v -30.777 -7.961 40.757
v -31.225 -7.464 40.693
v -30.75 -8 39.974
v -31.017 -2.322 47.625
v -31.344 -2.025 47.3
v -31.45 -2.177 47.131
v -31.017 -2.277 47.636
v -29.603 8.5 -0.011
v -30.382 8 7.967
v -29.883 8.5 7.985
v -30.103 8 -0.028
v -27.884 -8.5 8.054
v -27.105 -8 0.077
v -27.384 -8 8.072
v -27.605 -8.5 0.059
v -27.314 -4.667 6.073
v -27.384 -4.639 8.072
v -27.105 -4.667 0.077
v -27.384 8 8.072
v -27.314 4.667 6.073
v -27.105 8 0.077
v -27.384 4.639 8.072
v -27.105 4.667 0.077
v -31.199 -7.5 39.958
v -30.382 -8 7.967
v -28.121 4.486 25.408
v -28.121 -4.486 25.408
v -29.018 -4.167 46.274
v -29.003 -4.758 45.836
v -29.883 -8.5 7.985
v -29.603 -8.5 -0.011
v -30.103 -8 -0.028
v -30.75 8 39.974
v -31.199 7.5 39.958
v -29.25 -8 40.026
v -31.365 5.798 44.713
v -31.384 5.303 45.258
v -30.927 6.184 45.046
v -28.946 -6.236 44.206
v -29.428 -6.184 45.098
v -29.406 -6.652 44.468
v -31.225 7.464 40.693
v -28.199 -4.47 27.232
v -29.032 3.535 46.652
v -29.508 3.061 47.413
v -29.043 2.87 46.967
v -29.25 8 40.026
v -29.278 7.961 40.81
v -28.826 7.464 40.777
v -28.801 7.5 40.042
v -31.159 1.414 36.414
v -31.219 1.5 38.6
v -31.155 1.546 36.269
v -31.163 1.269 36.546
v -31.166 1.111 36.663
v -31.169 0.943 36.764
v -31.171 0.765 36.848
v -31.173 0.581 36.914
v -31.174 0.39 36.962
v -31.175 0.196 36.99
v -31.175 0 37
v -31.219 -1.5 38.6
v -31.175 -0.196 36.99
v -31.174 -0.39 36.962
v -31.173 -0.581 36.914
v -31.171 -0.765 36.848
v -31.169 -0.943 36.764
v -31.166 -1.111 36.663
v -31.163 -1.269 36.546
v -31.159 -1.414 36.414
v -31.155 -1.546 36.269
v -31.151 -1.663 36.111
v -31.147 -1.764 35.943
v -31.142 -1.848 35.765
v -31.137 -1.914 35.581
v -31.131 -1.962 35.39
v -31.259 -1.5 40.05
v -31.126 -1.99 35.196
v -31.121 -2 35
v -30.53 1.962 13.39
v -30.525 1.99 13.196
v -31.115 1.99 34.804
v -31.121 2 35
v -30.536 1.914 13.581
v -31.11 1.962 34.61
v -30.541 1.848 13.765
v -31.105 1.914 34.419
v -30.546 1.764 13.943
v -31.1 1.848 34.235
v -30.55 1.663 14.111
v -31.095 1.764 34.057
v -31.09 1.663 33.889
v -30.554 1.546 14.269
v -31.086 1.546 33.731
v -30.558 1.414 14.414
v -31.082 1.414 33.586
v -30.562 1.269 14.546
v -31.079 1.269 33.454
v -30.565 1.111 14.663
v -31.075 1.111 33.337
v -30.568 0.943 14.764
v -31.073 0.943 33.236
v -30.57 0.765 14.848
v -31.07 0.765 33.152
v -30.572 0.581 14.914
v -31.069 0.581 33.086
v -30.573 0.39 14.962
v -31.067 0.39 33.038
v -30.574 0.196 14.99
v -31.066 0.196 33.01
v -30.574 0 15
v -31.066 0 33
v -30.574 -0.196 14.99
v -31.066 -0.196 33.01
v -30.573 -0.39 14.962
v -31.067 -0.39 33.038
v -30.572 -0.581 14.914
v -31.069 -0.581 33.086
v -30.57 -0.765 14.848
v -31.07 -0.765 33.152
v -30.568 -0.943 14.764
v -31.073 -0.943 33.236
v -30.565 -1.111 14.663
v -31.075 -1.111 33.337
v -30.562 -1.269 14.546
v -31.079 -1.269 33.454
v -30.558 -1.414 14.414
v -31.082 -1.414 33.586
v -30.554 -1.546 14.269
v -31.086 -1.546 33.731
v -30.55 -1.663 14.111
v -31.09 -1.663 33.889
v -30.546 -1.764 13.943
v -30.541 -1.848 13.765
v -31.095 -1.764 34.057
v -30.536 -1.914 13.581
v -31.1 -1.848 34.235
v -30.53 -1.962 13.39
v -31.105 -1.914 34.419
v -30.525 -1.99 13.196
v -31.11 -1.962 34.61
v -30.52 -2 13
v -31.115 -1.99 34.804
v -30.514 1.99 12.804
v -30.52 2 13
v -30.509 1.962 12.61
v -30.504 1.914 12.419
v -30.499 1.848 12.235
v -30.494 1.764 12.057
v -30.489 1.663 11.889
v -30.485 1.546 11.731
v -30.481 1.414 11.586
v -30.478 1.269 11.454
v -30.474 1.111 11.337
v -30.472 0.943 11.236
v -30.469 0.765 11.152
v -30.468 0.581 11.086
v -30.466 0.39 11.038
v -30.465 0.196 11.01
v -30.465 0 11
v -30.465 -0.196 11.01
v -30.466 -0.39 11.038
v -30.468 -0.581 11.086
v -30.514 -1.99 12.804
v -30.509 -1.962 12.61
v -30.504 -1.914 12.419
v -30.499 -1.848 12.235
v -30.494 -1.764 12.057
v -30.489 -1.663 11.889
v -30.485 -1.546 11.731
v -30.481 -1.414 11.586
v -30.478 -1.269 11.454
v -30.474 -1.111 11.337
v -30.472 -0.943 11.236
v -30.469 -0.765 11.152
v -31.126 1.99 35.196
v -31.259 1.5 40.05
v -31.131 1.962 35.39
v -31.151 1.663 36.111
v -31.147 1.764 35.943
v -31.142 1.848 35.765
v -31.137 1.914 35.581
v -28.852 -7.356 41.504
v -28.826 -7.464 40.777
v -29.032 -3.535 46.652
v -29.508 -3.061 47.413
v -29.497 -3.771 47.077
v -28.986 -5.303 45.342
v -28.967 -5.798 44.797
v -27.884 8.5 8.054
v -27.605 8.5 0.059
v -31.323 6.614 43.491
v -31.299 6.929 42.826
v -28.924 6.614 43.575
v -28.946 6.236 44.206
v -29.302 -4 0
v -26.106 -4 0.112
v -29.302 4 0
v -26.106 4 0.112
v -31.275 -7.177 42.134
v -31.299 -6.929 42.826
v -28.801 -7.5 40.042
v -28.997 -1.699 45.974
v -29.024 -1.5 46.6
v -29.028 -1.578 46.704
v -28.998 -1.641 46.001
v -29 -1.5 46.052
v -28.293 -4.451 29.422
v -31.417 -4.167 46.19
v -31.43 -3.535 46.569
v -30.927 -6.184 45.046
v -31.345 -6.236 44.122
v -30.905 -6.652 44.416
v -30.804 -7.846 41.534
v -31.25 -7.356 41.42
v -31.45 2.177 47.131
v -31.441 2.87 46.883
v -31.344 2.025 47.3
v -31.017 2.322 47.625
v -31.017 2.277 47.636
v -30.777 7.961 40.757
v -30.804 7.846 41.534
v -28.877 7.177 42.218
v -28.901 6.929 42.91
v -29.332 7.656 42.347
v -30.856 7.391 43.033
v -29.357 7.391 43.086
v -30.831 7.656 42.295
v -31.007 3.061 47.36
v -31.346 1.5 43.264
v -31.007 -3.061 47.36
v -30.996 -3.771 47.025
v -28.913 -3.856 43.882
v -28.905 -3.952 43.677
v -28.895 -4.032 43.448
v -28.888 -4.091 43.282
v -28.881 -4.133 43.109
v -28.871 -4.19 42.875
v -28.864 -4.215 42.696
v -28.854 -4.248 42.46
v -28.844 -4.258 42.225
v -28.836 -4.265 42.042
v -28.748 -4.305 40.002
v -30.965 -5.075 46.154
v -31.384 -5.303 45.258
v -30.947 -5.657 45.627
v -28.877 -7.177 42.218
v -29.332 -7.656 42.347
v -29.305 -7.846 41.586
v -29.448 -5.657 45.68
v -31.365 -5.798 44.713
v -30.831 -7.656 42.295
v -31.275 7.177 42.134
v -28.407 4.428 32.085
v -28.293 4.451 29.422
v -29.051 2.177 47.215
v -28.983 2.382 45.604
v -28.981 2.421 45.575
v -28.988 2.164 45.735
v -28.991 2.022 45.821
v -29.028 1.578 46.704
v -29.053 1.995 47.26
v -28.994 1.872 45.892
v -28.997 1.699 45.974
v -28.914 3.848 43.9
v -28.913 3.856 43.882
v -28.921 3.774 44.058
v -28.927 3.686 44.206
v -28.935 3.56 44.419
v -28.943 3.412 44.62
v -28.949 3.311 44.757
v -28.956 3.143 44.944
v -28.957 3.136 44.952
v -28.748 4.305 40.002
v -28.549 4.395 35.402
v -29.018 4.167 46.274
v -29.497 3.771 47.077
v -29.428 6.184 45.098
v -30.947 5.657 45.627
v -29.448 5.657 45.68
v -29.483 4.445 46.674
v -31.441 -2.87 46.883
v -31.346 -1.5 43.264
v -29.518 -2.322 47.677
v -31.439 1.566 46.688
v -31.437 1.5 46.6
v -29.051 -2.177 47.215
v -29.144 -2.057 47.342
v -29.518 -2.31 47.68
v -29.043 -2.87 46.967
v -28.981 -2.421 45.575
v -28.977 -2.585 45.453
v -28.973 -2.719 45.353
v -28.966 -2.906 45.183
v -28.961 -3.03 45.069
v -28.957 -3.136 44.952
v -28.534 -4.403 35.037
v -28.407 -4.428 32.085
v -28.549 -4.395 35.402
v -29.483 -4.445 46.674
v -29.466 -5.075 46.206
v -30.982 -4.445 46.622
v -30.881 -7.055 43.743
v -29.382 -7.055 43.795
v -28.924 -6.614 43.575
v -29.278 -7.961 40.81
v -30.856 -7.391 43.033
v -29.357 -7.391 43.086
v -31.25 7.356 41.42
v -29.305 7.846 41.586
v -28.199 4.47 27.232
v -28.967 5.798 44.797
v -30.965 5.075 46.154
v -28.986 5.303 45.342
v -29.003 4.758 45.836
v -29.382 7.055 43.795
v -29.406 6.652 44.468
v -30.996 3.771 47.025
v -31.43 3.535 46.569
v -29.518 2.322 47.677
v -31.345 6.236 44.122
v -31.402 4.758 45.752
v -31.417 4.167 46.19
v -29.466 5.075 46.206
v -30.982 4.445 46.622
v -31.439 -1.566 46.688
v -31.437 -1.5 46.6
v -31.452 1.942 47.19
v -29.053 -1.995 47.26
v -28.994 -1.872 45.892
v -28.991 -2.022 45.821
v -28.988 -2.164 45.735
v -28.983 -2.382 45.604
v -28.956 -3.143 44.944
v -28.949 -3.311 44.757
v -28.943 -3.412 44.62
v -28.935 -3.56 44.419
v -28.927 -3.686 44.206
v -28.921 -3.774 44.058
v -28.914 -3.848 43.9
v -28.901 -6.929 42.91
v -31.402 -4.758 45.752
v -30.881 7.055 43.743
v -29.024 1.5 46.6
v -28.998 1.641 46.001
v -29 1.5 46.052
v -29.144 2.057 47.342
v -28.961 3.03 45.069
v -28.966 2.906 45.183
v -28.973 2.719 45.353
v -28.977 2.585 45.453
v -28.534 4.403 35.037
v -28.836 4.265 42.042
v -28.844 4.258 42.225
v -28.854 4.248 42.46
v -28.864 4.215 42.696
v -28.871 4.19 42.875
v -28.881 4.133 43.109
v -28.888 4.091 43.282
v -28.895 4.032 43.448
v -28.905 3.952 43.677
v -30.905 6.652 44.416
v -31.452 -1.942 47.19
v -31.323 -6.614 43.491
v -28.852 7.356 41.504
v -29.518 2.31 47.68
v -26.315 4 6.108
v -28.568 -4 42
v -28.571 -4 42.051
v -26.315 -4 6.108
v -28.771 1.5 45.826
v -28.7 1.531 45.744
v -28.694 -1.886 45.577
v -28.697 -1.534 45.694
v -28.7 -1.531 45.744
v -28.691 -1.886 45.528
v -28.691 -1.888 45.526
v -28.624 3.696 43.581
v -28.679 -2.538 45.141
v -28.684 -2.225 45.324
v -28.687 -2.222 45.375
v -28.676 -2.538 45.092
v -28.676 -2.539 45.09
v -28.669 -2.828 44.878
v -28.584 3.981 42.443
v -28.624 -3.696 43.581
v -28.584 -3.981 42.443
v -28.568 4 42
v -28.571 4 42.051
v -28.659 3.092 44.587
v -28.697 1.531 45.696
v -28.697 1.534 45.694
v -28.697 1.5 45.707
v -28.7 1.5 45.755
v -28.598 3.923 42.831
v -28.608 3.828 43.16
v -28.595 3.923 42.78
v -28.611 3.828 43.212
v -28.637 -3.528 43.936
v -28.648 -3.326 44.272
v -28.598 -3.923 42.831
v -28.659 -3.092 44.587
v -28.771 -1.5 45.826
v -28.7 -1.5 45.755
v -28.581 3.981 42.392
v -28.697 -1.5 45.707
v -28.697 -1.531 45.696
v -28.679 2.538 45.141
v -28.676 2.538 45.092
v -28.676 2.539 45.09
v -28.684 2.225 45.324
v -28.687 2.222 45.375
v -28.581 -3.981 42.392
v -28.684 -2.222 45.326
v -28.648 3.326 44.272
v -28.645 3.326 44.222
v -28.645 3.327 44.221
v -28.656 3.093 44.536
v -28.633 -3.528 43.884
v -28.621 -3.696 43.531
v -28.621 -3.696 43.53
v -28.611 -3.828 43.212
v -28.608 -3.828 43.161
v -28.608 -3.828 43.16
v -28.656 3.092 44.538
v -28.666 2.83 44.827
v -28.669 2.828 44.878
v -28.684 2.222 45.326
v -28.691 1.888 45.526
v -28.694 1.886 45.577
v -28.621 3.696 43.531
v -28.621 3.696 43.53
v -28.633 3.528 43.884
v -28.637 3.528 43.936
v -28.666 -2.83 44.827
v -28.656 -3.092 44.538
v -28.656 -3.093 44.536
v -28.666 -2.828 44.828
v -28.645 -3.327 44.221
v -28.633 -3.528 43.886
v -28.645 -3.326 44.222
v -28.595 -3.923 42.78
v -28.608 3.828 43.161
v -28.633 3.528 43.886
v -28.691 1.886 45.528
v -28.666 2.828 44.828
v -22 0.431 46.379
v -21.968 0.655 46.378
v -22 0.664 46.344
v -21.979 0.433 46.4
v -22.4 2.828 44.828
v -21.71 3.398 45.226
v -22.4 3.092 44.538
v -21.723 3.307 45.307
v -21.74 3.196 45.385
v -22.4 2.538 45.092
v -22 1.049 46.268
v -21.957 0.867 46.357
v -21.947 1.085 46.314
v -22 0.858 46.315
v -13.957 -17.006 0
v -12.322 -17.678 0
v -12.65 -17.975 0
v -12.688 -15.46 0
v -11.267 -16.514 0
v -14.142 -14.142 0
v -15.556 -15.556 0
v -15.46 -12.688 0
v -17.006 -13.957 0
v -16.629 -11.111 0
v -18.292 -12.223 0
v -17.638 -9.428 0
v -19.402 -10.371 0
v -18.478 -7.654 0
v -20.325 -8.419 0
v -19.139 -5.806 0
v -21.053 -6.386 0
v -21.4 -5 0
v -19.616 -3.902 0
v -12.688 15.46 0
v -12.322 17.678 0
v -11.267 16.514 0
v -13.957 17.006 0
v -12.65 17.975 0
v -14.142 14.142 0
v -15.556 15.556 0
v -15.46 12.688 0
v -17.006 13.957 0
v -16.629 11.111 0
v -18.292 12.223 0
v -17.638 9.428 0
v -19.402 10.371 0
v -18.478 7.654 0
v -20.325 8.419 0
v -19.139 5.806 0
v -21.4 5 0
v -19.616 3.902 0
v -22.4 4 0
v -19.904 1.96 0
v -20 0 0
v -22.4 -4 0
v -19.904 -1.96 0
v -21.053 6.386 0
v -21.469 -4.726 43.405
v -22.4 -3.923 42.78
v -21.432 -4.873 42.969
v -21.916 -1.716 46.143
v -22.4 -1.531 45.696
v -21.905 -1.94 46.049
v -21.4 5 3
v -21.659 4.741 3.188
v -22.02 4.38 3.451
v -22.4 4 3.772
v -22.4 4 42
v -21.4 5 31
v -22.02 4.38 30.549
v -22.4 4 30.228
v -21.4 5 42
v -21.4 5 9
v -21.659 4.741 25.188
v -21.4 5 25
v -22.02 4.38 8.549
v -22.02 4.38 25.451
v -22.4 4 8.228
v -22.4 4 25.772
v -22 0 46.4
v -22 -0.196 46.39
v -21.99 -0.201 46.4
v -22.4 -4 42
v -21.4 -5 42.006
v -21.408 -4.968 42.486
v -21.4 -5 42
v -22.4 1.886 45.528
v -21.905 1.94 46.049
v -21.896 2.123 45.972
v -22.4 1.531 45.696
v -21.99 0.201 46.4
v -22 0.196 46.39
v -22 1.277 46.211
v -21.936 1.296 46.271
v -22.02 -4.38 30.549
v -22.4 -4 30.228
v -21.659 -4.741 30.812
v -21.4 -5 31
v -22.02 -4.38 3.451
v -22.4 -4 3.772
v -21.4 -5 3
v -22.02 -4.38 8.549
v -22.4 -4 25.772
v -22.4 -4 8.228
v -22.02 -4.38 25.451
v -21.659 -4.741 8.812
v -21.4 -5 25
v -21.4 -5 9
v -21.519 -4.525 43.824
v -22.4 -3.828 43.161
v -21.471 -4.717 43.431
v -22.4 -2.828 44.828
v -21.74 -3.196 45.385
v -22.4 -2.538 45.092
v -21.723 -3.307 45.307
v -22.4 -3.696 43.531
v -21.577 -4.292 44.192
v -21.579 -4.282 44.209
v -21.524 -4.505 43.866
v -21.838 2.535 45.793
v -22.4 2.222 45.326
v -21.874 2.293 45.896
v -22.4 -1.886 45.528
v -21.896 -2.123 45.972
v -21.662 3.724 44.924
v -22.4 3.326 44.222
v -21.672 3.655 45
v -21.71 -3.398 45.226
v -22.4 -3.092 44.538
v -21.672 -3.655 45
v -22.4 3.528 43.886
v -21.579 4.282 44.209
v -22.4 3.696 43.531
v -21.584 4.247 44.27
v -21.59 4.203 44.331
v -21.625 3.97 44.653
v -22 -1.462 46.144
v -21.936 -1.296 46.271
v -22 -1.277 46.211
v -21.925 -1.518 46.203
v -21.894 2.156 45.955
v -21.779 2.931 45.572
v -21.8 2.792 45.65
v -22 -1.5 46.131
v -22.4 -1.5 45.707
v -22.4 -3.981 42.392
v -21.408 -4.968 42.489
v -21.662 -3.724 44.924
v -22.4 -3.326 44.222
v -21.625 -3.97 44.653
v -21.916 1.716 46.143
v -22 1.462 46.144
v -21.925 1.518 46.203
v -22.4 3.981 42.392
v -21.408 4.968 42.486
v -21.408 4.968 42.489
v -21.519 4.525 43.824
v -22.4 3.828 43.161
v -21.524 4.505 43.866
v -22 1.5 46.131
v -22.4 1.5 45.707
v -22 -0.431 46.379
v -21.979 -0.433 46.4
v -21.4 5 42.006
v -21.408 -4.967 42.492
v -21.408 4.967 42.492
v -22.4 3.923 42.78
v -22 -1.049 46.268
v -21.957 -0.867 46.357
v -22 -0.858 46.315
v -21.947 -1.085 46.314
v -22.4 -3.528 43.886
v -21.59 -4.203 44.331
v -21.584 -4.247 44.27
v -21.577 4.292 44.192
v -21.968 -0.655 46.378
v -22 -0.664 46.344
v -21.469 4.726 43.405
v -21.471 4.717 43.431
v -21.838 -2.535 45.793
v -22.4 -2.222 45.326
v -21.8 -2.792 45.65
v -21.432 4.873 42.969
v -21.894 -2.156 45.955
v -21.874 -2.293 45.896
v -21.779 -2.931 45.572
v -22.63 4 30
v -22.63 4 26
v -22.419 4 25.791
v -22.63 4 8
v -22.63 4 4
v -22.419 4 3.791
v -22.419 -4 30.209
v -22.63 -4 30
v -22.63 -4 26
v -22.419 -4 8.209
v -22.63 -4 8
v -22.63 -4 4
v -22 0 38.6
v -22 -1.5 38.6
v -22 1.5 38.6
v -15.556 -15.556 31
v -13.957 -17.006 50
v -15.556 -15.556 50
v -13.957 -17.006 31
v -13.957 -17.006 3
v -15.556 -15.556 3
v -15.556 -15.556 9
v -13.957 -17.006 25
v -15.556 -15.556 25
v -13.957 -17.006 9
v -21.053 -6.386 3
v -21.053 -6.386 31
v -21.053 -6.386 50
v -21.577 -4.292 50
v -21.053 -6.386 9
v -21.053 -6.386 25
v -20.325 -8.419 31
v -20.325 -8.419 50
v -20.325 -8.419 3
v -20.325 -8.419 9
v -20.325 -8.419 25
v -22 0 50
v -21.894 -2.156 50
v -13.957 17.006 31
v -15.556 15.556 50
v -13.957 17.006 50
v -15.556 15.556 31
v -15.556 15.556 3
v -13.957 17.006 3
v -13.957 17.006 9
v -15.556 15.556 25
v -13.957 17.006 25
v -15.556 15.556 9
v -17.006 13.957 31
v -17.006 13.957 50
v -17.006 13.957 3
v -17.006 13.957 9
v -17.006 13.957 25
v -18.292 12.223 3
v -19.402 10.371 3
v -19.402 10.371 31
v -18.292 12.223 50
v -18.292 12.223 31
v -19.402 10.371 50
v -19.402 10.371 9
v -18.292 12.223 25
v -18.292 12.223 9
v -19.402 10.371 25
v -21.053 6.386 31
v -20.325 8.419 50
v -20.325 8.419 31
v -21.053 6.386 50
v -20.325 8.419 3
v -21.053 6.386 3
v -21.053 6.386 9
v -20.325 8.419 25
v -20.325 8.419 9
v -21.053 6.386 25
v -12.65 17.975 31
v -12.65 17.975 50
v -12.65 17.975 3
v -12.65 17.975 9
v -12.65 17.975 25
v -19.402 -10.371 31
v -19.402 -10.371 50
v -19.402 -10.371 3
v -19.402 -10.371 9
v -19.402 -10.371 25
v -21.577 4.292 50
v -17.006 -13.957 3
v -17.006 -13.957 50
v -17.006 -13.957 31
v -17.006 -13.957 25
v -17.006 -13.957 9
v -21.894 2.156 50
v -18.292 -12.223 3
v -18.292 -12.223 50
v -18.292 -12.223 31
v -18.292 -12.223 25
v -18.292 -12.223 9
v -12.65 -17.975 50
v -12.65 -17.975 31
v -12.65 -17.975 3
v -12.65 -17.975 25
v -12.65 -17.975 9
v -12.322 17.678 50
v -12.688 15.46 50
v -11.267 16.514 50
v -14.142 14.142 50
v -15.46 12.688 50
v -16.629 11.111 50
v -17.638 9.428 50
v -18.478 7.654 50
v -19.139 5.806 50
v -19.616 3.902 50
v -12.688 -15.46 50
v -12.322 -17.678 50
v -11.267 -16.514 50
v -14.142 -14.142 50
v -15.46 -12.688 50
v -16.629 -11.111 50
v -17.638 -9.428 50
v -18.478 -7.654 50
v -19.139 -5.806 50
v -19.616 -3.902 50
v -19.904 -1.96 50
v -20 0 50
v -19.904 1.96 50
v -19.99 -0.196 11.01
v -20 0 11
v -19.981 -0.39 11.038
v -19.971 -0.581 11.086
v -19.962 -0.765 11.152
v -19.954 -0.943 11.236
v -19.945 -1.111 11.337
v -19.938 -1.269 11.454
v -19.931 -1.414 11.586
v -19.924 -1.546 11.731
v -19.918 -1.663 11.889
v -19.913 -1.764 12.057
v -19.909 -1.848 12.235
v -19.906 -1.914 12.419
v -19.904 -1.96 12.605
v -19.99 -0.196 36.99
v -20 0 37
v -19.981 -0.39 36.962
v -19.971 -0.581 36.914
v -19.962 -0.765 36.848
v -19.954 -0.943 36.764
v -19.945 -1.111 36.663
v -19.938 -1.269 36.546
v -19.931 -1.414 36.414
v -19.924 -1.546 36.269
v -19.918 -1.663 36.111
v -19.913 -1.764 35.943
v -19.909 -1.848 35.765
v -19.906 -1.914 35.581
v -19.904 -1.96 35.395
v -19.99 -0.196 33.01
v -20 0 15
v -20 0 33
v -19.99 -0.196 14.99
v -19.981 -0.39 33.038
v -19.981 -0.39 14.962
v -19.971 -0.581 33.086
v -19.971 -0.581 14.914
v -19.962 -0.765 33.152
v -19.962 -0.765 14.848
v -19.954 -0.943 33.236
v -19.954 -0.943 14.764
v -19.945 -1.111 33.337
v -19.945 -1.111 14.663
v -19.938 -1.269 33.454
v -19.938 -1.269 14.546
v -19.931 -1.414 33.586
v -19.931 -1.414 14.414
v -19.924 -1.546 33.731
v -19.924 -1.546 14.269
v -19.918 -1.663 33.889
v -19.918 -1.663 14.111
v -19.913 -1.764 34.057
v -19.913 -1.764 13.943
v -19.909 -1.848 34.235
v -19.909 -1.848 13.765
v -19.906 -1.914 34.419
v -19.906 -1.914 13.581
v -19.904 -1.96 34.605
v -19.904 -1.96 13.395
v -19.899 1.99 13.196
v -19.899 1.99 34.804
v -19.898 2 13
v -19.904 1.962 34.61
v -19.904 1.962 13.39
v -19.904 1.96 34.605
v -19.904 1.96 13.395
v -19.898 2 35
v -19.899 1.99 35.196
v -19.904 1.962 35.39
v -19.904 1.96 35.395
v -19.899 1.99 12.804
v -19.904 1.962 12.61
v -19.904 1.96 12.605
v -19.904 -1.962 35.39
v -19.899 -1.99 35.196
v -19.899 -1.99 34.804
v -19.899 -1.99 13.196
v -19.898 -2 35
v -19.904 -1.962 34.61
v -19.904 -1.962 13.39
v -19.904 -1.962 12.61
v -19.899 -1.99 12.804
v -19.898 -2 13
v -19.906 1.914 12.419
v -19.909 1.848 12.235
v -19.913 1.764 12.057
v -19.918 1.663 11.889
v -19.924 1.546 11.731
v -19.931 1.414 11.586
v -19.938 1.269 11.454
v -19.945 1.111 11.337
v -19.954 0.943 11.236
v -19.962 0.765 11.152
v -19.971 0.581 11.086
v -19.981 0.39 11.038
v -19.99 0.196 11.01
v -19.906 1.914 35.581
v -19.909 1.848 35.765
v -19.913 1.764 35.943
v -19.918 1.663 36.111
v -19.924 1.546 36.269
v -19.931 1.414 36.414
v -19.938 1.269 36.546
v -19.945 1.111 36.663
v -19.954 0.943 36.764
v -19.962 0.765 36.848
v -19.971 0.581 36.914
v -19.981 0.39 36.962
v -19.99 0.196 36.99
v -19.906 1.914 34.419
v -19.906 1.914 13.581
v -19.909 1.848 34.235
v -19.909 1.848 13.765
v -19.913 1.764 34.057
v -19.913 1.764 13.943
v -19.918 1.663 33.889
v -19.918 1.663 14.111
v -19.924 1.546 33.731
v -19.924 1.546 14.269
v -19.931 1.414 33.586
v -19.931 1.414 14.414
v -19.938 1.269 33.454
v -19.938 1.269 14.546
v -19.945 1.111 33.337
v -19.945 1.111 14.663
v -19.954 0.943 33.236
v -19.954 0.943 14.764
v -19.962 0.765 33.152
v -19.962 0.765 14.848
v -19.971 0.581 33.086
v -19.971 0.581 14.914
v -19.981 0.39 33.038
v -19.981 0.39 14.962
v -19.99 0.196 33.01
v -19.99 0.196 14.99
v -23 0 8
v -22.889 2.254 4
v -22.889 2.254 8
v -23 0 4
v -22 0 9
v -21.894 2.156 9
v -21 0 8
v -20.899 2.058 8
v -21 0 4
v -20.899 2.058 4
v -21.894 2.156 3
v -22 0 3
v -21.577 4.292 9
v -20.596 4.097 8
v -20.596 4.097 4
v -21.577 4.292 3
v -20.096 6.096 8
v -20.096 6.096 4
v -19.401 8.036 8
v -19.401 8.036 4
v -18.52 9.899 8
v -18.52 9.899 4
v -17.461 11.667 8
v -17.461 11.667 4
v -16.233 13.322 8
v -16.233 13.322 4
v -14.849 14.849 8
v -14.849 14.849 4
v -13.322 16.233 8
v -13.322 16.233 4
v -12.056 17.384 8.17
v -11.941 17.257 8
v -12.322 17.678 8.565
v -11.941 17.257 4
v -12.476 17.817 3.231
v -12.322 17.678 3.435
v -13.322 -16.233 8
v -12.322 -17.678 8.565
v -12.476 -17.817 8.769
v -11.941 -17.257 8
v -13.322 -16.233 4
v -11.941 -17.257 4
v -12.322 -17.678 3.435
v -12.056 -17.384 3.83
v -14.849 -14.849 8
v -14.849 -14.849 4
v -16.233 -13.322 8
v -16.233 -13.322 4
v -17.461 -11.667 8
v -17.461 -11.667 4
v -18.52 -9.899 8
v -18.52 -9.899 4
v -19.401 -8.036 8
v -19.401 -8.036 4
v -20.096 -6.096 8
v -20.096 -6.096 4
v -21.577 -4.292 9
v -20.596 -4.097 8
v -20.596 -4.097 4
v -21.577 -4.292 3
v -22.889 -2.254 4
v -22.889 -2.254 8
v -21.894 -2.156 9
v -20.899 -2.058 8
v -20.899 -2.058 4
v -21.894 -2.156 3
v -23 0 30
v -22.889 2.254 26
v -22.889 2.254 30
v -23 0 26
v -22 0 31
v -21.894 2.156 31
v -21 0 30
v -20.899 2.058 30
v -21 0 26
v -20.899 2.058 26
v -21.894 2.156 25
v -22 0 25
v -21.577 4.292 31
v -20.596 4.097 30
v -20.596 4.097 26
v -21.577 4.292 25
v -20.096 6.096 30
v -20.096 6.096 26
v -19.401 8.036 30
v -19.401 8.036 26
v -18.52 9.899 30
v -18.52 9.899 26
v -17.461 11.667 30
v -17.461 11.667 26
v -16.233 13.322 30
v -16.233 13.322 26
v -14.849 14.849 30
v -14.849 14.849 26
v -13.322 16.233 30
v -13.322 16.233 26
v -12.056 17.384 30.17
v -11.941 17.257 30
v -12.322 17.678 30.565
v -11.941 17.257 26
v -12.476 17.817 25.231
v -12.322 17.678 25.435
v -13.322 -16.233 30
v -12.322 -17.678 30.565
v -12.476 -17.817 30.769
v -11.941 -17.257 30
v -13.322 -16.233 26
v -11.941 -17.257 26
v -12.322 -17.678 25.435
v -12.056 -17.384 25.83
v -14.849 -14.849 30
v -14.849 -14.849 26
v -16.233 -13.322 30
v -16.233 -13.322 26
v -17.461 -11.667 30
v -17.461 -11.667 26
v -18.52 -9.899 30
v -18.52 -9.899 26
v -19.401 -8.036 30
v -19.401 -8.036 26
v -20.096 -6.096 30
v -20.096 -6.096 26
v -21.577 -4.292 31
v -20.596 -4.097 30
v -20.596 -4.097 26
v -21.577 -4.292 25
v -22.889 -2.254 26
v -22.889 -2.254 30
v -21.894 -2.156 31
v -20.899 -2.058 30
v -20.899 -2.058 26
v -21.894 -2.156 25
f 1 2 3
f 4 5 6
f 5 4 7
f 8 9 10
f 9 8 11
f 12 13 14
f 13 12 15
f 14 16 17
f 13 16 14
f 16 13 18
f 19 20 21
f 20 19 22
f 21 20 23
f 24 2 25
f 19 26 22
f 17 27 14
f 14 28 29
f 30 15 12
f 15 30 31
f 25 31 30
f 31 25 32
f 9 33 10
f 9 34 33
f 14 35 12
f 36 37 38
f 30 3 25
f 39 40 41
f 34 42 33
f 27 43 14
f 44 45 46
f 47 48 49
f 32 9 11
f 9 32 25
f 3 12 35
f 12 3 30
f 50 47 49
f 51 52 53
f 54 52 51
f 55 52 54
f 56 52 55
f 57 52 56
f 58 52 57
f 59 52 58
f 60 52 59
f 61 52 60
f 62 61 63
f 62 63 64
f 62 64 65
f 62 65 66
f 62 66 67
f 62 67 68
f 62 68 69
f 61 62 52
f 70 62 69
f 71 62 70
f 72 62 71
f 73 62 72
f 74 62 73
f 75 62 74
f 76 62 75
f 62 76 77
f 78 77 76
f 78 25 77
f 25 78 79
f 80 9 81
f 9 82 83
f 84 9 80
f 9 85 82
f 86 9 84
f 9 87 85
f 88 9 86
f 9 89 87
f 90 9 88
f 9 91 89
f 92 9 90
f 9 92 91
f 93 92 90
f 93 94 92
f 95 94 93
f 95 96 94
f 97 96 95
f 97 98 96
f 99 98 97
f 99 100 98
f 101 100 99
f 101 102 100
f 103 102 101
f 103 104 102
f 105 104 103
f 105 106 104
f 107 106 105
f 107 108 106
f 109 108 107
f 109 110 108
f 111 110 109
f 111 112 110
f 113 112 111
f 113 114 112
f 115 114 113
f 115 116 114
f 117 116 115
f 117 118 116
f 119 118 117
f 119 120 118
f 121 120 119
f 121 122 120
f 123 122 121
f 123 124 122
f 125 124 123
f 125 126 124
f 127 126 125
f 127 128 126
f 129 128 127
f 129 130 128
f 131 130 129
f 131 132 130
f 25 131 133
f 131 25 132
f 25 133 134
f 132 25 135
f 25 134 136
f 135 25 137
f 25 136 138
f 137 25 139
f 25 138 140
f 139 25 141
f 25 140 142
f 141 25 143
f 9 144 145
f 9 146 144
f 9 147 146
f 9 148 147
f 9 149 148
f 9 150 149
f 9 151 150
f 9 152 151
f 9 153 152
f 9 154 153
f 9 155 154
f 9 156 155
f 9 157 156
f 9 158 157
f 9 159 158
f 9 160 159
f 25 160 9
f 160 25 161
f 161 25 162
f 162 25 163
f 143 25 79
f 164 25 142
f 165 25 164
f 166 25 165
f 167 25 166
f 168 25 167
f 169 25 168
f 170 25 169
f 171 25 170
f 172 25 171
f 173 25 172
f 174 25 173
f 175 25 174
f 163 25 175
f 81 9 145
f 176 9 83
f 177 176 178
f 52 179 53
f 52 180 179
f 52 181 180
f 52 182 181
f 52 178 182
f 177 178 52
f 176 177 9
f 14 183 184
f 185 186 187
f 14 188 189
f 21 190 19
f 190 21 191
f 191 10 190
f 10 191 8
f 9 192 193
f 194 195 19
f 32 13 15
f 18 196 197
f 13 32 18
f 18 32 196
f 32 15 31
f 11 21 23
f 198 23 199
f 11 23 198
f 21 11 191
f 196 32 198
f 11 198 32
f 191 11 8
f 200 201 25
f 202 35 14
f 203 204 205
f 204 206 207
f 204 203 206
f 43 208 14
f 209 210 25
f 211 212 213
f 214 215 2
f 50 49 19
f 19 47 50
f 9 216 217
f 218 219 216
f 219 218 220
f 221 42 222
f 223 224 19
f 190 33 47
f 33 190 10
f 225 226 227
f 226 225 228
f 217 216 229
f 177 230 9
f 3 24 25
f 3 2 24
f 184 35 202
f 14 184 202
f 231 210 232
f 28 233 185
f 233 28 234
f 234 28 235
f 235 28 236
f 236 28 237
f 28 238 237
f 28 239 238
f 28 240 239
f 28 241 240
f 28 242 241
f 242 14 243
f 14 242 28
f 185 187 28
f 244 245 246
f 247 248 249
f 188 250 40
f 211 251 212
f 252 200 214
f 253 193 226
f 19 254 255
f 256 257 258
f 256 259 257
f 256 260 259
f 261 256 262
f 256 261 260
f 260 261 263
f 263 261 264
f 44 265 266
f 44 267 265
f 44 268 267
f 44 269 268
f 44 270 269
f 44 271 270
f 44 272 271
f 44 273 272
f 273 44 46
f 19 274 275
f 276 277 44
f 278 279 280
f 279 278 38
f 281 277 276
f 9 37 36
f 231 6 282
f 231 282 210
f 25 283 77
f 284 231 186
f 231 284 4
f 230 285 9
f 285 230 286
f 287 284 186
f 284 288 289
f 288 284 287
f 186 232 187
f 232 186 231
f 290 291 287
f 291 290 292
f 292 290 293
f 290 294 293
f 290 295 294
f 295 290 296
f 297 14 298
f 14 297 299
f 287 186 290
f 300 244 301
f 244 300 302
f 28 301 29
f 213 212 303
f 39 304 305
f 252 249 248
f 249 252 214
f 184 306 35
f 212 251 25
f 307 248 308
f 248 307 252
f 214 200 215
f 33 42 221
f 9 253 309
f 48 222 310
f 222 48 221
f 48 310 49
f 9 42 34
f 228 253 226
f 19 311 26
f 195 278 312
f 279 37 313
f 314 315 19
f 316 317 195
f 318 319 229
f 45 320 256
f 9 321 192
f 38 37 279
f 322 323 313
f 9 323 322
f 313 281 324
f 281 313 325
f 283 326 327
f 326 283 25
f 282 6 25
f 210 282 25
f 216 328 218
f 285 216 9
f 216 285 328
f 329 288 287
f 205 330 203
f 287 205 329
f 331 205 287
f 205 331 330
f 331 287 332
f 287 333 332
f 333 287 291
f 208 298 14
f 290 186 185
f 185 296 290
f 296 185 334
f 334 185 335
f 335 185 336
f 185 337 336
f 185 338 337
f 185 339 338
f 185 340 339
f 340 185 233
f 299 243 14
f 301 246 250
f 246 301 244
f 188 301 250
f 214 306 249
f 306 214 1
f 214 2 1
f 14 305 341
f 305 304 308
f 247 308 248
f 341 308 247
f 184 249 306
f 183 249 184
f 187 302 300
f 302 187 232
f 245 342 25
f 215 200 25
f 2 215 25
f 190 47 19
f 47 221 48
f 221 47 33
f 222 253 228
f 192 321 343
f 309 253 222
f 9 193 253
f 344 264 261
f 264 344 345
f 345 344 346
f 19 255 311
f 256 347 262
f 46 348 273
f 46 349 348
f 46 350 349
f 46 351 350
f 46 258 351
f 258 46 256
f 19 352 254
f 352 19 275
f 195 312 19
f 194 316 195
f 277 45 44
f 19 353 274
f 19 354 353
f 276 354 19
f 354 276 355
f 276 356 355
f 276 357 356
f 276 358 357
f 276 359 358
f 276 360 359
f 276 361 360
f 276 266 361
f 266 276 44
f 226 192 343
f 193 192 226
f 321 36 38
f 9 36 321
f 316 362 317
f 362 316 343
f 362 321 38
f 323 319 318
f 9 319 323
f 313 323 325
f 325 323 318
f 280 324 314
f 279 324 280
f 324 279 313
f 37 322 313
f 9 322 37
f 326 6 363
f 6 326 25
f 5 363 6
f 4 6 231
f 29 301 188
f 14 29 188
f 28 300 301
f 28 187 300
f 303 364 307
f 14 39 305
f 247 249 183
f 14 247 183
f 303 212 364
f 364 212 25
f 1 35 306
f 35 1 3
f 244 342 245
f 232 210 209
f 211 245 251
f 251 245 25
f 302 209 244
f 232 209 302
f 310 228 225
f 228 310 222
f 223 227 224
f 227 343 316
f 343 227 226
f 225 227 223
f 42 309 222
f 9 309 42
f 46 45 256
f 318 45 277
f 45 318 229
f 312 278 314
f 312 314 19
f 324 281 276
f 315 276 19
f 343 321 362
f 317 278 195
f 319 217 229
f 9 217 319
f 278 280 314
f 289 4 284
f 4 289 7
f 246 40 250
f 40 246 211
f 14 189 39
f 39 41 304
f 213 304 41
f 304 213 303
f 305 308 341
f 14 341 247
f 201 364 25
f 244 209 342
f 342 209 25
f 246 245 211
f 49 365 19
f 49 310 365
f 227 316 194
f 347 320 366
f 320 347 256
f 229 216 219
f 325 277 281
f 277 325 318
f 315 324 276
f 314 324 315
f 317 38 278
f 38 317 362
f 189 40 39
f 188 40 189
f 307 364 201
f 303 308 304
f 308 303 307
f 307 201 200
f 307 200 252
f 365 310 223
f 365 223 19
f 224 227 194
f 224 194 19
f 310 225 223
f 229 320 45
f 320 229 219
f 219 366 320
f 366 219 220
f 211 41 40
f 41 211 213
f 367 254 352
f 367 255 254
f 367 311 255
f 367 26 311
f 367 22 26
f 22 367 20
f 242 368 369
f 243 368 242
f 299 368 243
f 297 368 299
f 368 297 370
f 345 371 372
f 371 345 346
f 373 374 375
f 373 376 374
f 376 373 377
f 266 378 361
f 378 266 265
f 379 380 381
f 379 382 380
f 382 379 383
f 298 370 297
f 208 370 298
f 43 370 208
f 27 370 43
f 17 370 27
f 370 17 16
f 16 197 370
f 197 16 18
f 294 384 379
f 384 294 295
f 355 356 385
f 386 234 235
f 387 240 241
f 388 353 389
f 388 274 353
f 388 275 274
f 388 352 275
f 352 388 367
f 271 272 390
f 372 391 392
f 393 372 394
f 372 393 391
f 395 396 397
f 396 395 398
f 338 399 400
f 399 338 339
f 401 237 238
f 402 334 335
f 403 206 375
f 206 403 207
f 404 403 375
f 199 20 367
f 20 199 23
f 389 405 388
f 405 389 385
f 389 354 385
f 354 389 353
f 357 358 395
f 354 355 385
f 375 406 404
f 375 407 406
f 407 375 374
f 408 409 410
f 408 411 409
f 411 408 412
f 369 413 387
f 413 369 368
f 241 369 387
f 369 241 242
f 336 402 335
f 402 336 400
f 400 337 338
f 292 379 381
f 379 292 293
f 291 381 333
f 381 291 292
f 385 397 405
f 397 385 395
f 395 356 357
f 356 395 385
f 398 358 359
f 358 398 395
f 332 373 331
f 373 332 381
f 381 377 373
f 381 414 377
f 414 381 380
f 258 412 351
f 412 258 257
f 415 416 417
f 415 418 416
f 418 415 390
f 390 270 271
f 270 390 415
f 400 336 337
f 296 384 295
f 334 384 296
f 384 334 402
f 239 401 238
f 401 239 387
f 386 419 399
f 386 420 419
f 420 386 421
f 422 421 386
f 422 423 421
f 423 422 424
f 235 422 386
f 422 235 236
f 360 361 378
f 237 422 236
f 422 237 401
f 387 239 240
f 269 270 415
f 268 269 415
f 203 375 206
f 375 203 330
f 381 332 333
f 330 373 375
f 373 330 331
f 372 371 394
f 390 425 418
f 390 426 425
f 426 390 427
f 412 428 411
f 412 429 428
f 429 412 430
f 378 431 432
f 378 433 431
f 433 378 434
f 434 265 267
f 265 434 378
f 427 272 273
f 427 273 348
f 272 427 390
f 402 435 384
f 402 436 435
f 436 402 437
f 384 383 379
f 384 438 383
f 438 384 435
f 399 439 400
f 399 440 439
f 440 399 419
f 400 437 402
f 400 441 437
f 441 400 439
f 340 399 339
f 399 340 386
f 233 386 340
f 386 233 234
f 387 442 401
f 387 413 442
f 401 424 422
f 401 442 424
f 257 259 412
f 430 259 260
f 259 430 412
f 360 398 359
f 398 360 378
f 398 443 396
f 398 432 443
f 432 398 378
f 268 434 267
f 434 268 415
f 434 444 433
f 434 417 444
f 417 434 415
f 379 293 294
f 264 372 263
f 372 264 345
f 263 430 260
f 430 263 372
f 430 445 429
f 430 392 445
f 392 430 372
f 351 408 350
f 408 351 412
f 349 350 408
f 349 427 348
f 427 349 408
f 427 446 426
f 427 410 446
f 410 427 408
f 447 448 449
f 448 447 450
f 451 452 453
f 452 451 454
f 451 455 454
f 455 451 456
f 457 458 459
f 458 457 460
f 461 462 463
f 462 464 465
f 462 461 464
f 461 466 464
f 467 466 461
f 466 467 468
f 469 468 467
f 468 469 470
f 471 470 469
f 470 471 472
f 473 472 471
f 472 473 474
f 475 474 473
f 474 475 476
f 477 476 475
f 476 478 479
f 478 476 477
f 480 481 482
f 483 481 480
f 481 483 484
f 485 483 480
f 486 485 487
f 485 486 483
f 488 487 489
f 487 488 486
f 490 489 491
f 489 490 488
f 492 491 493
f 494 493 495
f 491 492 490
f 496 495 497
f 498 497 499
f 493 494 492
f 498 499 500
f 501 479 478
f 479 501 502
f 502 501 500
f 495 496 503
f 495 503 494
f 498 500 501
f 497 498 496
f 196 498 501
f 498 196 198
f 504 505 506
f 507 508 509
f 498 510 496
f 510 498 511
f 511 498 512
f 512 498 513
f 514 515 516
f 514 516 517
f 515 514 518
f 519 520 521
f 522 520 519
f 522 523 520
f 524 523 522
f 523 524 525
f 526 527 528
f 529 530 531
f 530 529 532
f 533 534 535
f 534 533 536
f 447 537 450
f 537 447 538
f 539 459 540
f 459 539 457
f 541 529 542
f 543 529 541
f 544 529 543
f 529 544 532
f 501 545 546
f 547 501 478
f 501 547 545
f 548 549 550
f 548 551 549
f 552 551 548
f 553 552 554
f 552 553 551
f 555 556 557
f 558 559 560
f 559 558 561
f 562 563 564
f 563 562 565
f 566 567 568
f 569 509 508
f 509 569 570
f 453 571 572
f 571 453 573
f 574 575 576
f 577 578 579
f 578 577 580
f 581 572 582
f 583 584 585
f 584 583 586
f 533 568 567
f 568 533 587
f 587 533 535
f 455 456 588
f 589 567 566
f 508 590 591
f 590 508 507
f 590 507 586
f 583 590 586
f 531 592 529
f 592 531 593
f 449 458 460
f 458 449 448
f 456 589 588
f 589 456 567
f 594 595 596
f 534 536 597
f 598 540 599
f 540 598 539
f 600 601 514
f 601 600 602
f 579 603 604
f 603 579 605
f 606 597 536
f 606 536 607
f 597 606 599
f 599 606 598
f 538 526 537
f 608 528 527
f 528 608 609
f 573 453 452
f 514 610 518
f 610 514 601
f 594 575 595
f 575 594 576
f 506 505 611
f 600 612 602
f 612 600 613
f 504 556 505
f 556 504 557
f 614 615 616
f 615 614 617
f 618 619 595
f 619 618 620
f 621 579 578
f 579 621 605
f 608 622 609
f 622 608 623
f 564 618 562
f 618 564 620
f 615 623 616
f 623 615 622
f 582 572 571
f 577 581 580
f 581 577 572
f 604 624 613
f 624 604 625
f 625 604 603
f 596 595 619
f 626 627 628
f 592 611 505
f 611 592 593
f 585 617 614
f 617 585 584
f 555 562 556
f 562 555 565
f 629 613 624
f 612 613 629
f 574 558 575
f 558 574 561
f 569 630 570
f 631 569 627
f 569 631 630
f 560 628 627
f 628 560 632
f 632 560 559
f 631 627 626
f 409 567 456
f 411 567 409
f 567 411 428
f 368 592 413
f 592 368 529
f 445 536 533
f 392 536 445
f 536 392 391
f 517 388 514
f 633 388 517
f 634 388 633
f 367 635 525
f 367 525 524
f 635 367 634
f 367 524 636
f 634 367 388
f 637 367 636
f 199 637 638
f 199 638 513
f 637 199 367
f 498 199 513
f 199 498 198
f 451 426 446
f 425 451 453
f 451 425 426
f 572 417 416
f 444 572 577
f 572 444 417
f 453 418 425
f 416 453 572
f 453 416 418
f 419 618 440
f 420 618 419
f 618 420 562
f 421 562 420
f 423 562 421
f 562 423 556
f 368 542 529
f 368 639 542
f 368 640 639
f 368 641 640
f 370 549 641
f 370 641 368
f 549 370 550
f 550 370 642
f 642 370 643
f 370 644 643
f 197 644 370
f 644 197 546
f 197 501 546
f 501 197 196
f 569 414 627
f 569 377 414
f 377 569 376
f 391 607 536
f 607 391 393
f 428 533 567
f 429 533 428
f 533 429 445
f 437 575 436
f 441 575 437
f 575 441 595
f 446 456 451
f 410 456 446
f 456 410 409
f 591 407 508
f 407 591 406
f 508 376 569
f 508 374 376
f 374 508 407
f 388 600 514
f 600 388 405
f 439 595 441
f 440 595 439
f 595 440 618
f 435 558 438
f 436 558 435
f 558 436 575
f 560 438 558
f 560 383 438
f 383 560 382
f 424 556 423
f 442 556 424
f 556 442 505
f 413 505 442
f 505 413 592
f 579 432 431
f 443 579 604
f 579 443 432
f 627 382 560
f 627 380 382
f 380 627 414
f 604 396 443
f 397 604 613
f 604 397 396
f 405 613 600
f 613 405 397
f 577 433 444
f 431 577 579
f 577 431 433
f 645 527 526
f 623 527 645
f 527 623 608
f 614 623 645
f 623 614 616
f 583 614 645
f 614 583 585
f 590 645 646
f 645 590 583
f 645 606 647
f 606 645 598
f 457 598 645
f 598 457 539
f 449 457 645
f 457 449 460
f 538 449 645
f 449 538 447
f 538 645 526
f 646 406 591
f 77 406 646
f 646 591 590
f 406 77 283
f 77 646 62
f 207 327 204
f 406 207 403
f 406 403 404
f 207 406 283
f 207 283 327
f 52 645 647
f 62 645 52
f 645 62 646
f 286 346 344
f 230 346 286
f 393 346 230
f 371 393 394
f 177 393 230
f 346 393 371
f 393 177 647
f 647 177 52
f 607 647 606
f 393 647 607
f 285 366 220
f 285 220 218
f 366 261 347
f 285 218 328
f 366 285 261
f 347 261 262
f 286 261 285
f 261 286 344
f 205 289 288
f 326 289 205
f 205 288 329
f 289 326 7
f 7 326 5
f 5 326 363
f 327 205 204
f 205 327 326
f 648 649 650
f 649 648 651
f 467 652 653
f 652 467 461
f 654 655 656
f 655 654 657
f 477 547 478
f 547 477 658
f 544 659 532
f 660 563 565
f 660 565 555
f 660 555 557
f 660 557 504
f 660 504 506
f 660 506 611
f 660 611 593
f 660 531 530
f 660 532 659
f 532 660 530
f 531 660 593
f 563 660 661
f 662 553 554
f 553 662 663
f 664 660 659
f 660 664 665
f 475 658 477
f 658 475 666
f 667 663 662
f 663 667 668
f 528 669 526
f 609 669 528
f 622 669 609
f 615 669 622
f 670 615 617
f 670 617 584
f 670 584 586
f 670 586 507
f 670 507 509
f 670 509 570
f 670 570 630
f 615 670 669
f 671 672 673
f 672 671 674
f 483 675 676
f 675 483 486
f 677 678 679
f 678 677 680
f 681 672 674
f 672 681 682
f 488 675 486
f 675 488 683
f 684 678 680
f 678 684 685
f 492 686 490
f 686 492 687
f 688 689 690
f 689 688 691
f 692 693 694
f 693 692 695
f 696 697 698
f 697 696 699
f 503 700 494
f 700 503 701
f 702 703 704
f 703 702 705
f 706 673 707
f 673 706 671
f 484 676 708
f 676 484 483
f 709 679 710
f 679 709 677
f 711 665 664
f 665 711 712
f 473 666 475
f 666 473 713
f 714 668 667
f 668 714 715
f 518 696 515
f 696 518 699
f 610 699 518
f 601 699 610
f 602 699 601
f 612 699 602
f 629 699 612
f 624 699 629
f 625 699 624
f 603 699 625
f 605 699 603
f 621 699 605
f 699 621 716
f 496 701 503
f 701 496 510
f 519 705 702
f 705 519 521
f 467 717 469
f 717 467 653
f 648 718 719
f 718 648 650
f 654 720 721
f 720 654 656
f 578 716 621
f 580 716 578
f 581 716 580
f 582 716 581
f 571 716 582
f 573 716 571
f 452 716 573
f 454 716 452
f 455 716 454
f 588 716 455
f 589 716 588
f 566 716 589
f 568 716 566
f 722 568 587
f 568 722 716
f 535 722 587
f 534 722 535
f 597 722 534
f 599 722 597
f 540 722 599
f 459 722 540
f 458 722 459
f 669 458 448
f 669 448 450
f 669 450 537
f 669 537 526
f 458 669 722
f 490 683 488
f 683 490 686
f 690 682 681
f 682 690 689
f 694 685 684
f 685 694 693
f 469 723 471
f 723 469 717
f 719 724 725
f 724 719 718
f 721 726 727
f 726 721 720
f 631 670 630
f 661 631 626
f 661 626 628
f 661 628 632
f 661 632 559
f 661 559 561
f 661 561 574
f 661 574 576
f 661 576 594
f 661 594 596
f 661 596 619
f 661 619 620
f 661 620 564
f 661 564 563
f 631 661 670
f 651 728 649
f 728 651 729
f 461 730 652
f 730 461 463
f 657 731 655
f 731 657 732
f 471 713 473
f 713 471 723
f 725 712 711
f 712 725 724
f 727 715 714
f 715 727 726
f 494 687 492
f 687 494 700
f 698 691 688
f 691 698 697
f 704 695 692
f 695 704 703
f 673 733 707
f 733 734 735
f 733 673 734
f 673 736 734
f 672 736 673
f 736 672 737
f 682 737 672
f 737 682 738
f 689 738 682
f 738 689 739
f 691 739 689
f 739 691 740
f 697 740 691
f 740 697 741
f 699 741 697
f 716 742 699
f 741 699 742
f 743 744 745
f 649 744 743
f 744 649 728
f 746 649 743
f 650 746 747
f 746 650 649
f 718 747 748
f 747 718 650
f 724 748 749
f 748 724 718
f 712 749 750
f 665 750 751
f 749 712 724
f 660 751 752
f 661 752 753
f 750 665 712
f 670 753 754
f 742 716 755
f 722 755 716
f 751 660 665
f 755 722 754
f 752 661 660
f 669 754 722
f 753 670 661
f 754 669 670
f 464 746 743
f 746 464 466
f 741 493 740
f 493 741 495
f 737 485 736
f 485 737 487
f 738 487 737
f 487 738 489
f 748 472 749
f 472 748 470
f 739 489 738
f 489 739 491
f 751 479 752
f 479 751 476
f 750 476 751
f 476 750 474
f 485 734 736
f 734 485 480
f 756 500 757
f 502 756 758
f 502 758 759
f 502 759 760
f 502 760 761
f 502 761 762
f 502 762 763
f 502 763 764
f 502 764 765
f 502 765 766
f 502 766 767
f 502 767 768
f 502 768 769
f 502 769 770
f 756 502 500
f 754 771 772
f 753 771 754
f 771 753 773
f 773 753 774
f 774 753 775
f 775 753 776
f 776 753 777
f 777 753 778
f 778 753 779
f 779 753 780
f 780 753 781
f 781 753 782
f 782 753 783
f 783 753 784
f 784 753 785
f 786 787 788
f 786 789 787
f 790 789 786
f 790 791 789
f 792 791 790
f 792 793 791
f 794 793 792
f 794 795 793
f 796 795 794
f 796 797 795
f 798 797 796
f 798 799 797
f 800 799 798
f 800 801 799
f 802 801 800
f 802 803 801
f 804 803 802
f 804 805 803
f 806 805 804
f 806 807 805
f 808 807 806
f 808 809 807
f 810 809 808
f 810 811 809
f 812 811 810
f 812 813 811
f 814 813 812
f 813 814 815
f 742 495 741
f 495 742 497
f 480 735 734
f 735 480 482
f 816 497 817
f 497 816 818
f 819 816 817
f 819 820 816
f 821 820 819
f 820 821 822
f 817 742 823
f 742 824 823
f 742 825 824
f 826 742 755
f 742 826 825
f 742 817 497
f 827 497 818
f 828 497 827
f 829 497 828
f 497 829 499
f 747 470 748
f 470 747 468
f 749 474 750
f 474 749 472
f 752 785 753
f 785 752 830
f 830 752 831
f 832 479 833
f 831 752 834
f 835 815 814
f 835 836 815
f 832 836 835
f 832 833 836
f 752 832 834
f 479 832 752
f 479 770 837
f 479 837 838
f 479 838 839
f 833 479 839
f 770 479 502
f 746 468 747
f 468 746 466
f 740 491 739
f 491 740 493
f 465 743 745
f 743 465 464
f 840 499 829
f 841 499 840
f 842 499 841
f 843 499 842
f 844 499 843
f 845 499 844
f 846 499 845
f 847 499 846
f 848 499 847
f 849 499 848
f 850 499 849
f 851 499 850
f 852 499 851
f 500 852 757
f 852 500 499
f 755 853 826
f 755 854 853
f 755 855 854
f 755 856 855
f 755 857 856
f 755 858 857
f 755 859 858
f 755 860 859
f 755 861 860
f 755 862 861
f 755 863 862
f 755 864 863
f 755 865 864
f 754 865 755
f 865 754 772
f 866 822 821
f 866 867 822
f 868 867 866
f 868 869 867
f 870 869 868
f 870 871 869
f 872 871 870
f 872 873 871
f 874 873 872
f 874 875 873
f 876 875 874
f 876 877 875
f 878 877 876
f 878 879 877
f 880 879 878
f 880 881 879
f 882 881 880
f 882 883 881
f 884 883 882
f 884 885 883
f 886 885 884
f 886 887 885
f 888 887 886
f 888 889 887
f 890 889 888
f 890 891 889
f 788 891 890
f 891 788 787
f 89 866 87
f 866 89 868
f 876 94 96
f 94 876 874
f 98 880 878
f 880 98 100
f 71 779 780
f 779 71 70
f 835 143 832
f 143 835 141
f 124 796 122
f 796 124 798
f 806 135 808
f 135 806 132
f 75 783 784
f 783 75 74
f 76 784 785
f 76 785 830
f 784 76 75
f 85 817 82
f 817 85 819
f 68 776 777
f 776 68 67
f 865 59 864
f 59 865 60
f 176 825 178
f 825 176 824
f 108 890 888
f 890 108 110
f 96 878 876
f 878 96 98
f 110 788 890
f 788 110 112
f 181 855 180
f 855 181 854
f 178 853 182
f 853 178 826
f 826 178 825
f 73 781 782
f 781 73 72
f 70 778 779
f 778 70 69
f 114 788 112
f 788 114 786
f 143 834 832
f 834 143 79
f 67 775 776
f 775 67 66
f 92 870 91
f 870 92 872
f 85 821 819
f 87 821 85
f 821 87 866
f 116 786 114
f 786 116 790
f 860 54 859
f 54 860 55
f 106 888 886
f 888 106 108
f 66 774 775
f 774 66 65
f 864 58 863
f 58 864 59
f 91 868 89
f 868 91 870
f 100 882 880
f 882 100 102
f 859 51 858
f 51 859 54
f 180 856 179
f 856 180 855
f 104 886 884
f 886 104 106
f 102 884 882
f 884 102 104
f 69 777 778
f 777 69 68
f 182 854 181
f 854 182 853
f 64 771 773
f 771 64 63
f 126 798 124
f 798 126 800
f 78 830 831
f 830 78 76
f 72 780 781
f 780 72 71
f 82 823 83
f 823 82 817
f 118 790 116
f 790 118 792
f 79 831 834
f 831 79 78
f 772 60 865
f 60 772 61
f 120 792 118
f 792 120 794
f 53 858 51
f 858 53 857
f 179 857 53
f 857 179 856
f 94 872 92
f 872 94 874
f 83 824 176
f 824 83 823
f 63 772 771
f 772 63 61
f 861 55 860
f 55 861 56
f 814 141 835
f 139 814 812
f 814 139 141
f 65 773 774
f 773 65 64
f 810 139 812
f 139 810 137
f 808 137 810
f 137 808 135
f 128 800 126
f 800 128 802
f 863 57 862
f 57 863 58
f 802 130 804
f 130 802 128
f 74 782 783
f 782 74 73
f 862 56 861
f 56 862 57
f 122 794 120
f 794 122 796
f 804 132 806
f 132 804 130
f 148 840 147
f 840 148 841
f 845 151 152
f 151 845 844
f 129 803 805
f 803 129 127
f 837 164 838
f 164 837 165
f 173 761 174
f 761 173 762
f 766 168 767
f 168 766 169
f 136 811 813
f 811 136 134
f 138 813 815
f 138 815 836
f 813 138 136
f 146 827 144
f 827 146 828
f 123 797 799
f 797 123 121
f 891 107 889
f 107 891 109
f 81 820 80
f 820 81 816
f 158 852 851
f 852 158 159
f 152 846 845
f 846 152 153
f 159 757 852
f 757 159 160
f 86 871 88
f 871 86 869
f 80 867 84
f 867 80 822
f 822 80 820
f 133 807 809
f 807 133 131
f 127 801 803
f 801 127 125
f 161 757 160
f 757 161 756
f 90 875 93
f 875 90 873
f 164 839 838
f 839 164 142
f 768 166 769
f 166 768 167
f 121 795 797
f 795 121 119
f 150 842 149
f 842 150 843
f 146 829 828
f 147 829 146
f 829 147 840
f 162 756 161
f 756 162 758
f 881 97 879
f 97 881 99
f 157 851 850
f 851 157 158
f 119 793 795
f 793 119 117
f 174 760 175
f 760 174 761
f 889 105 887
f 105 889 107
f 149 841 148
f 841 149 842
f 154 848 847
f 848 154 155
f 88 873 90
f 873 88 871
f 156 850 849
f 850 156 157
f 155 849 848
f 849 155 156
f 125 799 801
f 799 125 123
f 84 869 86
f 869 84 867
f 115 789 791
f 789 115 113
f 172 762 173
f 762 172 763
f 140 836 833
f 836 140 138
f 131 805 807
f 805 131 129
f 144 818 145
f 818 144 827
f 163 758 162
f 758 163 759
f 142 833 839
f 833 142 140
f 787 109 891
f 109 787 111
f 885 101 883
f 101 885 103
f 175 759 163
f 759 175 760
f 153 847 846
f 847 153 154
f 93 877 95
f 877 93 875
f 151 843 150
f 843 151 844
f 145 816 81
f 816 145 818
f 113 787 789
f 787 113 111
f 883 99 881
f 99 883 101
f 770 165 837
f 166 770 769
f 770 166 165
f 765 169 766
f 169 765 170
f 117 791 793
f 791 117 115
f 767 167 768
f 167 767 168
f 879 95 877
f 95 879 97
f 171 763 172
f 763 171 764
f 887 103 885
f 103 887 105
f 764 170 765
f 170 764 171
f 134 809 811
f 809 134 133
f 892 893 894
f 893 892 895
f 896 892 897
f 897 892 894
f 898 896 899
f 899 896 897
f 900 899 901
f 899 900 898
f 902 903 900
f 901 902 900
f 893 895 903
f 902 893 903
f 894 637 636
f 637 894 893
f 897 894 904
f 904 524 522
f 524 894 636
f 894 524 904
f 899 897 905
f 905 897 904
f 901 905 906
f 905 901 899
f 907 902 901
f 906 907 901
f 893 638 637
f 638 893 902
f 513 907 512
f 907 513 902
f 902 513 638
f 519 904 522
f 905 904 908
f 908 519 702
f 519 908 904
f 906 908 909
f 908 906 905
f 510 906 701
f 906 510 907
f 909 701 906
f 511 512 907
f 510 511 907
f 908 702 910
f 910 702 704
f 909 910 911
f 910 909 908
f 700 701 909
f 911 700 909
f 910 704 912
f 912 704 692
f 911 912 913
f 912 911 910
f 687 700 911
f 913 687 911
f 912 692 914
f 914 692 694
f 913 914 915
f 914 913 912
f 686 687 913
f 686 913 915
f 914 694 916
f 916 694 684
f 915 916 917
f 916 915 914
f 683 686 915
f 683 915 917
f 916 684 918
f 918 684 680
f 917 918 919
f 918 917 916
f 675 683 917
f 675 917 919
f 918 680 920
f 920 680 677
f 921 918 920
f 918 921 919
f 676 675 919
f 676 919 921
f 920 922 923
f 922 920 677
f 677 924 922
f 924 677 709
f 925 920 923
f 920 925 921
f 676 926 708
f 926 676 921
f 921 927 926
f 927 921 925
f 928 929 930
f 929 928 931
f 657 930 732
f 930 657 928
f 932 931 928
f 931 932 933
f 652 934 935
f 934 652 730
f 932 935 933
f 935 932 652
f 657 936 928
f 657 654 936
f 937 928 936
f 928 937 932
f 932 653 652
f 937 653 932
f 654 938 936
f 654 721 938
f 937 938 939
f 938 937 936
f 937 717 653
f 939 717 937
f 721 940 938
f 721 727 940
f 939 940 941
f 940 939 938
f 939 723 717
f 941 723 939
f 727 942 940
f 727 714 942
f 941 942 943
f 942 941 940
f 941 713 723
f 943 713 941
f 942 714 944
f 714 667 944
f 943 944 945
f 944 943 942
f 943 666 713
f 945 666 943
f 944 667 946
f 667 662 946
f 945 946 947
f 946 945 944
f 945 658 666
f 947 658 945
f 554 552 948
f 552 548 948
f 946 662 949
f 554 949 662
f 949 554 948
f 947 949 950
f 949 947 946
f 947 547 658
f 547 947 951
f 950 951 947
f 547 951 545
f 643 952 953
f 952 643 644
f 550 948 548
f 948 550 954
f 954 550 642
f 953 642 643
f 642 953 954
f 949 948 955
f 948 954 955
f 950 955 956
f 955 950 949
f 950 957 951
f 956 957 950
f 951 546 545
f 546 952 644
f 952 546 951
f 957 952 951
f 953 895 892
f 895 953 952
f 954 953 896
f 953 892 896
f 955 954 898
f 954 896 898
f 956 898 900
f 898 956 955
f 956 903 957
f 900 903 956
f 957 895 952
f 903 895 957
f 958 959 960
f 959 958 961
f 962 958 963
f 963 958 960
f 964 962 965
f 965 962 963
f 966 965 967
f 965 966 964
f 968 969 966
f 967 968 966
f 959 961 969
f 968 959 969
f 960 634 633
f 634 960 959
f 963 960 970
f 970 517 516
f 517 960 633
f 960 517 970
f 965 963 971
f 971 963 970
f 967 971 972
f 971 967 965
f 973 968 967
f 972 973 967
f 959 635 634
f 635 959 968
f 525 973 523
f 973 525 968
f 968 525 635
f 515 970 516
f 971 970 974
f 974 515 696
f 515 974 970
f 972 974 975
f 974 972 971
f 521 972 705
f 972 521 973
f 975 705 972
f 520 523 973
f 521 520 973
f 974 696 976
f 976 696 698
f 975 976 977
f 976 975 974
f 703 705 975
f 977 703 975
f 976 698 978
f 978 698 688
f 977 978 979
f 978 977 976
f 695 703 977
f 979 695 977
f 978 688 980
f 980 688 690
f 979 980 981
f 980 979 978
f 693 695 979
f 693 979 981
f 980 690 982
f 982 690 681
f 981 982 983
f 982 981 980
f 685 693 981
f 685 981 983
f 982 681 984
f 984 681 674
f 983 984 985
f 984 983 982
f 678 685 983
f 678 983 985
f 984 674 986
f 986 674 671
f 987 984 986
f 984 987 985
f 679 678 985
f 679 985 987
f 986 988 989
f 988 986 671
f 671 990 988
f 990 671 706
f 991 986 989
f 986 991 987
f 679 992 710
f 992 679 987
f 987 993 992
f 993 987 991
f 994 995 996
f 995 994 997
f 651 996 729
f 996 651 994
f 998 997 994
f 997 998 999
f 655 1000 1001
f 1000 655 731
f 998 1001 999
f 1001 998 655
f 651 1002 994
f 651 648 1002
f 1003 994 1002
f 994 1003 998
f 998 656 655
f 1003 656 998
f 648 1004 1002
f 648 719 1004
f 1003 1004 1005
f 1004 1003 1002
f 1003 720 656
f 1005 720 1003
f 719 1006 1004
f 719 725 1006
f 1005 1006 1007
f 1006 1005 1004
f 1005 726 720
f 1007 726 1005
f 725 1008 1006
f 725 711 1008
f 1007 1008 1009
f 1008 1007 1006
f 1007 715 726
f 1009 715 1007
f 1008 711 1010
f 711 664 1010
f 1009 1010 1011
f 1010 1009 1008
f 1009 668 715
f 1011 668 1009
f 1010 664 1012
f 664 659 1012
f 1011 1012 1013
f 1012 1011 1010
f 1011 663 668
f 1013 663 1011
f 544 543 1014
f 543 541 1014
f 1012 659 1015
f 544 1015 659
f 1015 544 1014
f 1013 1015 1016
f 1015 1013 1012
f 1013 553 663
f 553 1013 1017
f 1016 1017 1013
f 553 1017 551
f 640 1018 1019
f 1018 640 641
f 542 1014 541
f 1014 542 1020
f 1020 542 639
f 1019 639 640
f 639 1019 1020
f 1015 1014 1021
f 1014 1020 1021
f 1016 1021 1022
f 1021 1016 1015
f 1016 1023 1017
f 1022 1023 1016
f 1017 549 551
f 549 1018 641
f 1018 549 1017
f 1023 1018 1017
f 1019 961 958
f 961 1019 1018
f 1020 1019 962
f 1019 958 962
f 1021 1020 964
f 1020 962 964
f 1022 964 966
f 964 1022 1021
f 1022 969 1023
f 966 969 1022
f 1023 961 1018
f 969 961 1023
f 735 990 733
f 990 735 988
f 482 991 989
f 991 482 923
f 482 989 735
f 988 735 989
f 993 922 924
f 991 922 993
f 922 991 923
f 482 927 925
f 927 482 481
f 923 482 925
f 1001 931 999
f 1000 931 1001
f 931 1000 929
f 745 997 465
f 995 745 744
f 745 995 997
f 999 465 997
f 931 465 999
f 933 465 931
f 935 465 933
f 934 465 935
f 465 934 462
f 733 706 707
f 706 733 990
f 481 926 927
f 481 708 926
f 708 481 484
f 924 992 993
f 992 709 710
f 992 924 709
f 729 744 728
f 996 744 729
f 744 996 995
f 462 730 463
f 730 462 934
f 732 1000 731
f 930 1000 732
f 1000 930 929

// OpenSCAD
$fn=64;
slot_thickness=3;
slot_width=17;
module clip() {
    difference() {
        union(){
            translate([0,0,-3])
            rotate([0,-2,0])
            {
                hull() {
                    cylinder(h=slot_thickness-1.5, d=slot_width-1, center=true);
                    cylinder(h=slot_thickness-0.6, d=slot_width-2, center=true);
                    translate([40-4,0])
                        cube([8,slot_width,slot_thickness-1], center=true);
                    translate([40-4,0])
                        cube([8,slot_width-1,slot_thickness], center=true);
                } 
                
                hull() {
                    translate([37,0,2])
                        cube([6,8,1], center=true);
                    translate([37,0,0.5])
                        cube([6,10,1], center=true);
                    translate([-2,0,1])
                        cylinder(h=1, d=8, center=true);
                    translate([-2,0,0.5])
                        cylinder(h=1, d=9, center=true);
                }
            }
            hull() {
                off=5.1;
                translate([22,0,off])
                    cube([36,8,1], center=true);
                translate([22,0,off+1])
                    cube([36,10,1], center=true);
                translate([-2,0,off])
                    cylinder(h=1, d=8, center=true);
                translate([-2,0,off+1])
                    cylinder(h=1, d=10, center=true);
            }
            
            hull() {
                translate([22,0,2])
                    cube([36,8,10], center=true);

                translate([-2,0,2])
                cylinder(h=10, d=8, center=true);
            }
        }
        translate([-8.6,0])
        linear_extrude(10, center=true) {
            polygon([
                [0,-3],
                [2,-1.5],
                [10,-1.5],
                [10,1.5],
                [2,1.5],
                [0,3]
            ]);
        }
    }
}

module tiewrapslot() {
    rotate_extrude()
    {
        translate([21,0])
            polygon([
                [1,0],
                [2,1],
                [2,5],        
                [1,6],
                [0,5],
                [0,1],
            ]); 
    }
}
intersection(){
    translate([-30,0,0])
    cylinder(h=100, d=50, center=true);
difference(){
    union() {
    translate([-20,0,0]){
        translate([-7,0,40])
            rotate([0,90,0])
                clip();
        }
        cylinder(h=50, d=44);
    }
    cylinder(h=150, d=40, center=true);
    translate([0,0,35])
    rotate([0,90,0])
        cylinder(h=150, d=4, center=true);
    
    translate([0,0,13])
    rotate([0,90,0])
    cylinder(h=150, d=4, center=true);
    
    translate([-0,0,3])
        tiewrapslot();
    translate([-0,0,25])
        tiewrapslot();
}
}
